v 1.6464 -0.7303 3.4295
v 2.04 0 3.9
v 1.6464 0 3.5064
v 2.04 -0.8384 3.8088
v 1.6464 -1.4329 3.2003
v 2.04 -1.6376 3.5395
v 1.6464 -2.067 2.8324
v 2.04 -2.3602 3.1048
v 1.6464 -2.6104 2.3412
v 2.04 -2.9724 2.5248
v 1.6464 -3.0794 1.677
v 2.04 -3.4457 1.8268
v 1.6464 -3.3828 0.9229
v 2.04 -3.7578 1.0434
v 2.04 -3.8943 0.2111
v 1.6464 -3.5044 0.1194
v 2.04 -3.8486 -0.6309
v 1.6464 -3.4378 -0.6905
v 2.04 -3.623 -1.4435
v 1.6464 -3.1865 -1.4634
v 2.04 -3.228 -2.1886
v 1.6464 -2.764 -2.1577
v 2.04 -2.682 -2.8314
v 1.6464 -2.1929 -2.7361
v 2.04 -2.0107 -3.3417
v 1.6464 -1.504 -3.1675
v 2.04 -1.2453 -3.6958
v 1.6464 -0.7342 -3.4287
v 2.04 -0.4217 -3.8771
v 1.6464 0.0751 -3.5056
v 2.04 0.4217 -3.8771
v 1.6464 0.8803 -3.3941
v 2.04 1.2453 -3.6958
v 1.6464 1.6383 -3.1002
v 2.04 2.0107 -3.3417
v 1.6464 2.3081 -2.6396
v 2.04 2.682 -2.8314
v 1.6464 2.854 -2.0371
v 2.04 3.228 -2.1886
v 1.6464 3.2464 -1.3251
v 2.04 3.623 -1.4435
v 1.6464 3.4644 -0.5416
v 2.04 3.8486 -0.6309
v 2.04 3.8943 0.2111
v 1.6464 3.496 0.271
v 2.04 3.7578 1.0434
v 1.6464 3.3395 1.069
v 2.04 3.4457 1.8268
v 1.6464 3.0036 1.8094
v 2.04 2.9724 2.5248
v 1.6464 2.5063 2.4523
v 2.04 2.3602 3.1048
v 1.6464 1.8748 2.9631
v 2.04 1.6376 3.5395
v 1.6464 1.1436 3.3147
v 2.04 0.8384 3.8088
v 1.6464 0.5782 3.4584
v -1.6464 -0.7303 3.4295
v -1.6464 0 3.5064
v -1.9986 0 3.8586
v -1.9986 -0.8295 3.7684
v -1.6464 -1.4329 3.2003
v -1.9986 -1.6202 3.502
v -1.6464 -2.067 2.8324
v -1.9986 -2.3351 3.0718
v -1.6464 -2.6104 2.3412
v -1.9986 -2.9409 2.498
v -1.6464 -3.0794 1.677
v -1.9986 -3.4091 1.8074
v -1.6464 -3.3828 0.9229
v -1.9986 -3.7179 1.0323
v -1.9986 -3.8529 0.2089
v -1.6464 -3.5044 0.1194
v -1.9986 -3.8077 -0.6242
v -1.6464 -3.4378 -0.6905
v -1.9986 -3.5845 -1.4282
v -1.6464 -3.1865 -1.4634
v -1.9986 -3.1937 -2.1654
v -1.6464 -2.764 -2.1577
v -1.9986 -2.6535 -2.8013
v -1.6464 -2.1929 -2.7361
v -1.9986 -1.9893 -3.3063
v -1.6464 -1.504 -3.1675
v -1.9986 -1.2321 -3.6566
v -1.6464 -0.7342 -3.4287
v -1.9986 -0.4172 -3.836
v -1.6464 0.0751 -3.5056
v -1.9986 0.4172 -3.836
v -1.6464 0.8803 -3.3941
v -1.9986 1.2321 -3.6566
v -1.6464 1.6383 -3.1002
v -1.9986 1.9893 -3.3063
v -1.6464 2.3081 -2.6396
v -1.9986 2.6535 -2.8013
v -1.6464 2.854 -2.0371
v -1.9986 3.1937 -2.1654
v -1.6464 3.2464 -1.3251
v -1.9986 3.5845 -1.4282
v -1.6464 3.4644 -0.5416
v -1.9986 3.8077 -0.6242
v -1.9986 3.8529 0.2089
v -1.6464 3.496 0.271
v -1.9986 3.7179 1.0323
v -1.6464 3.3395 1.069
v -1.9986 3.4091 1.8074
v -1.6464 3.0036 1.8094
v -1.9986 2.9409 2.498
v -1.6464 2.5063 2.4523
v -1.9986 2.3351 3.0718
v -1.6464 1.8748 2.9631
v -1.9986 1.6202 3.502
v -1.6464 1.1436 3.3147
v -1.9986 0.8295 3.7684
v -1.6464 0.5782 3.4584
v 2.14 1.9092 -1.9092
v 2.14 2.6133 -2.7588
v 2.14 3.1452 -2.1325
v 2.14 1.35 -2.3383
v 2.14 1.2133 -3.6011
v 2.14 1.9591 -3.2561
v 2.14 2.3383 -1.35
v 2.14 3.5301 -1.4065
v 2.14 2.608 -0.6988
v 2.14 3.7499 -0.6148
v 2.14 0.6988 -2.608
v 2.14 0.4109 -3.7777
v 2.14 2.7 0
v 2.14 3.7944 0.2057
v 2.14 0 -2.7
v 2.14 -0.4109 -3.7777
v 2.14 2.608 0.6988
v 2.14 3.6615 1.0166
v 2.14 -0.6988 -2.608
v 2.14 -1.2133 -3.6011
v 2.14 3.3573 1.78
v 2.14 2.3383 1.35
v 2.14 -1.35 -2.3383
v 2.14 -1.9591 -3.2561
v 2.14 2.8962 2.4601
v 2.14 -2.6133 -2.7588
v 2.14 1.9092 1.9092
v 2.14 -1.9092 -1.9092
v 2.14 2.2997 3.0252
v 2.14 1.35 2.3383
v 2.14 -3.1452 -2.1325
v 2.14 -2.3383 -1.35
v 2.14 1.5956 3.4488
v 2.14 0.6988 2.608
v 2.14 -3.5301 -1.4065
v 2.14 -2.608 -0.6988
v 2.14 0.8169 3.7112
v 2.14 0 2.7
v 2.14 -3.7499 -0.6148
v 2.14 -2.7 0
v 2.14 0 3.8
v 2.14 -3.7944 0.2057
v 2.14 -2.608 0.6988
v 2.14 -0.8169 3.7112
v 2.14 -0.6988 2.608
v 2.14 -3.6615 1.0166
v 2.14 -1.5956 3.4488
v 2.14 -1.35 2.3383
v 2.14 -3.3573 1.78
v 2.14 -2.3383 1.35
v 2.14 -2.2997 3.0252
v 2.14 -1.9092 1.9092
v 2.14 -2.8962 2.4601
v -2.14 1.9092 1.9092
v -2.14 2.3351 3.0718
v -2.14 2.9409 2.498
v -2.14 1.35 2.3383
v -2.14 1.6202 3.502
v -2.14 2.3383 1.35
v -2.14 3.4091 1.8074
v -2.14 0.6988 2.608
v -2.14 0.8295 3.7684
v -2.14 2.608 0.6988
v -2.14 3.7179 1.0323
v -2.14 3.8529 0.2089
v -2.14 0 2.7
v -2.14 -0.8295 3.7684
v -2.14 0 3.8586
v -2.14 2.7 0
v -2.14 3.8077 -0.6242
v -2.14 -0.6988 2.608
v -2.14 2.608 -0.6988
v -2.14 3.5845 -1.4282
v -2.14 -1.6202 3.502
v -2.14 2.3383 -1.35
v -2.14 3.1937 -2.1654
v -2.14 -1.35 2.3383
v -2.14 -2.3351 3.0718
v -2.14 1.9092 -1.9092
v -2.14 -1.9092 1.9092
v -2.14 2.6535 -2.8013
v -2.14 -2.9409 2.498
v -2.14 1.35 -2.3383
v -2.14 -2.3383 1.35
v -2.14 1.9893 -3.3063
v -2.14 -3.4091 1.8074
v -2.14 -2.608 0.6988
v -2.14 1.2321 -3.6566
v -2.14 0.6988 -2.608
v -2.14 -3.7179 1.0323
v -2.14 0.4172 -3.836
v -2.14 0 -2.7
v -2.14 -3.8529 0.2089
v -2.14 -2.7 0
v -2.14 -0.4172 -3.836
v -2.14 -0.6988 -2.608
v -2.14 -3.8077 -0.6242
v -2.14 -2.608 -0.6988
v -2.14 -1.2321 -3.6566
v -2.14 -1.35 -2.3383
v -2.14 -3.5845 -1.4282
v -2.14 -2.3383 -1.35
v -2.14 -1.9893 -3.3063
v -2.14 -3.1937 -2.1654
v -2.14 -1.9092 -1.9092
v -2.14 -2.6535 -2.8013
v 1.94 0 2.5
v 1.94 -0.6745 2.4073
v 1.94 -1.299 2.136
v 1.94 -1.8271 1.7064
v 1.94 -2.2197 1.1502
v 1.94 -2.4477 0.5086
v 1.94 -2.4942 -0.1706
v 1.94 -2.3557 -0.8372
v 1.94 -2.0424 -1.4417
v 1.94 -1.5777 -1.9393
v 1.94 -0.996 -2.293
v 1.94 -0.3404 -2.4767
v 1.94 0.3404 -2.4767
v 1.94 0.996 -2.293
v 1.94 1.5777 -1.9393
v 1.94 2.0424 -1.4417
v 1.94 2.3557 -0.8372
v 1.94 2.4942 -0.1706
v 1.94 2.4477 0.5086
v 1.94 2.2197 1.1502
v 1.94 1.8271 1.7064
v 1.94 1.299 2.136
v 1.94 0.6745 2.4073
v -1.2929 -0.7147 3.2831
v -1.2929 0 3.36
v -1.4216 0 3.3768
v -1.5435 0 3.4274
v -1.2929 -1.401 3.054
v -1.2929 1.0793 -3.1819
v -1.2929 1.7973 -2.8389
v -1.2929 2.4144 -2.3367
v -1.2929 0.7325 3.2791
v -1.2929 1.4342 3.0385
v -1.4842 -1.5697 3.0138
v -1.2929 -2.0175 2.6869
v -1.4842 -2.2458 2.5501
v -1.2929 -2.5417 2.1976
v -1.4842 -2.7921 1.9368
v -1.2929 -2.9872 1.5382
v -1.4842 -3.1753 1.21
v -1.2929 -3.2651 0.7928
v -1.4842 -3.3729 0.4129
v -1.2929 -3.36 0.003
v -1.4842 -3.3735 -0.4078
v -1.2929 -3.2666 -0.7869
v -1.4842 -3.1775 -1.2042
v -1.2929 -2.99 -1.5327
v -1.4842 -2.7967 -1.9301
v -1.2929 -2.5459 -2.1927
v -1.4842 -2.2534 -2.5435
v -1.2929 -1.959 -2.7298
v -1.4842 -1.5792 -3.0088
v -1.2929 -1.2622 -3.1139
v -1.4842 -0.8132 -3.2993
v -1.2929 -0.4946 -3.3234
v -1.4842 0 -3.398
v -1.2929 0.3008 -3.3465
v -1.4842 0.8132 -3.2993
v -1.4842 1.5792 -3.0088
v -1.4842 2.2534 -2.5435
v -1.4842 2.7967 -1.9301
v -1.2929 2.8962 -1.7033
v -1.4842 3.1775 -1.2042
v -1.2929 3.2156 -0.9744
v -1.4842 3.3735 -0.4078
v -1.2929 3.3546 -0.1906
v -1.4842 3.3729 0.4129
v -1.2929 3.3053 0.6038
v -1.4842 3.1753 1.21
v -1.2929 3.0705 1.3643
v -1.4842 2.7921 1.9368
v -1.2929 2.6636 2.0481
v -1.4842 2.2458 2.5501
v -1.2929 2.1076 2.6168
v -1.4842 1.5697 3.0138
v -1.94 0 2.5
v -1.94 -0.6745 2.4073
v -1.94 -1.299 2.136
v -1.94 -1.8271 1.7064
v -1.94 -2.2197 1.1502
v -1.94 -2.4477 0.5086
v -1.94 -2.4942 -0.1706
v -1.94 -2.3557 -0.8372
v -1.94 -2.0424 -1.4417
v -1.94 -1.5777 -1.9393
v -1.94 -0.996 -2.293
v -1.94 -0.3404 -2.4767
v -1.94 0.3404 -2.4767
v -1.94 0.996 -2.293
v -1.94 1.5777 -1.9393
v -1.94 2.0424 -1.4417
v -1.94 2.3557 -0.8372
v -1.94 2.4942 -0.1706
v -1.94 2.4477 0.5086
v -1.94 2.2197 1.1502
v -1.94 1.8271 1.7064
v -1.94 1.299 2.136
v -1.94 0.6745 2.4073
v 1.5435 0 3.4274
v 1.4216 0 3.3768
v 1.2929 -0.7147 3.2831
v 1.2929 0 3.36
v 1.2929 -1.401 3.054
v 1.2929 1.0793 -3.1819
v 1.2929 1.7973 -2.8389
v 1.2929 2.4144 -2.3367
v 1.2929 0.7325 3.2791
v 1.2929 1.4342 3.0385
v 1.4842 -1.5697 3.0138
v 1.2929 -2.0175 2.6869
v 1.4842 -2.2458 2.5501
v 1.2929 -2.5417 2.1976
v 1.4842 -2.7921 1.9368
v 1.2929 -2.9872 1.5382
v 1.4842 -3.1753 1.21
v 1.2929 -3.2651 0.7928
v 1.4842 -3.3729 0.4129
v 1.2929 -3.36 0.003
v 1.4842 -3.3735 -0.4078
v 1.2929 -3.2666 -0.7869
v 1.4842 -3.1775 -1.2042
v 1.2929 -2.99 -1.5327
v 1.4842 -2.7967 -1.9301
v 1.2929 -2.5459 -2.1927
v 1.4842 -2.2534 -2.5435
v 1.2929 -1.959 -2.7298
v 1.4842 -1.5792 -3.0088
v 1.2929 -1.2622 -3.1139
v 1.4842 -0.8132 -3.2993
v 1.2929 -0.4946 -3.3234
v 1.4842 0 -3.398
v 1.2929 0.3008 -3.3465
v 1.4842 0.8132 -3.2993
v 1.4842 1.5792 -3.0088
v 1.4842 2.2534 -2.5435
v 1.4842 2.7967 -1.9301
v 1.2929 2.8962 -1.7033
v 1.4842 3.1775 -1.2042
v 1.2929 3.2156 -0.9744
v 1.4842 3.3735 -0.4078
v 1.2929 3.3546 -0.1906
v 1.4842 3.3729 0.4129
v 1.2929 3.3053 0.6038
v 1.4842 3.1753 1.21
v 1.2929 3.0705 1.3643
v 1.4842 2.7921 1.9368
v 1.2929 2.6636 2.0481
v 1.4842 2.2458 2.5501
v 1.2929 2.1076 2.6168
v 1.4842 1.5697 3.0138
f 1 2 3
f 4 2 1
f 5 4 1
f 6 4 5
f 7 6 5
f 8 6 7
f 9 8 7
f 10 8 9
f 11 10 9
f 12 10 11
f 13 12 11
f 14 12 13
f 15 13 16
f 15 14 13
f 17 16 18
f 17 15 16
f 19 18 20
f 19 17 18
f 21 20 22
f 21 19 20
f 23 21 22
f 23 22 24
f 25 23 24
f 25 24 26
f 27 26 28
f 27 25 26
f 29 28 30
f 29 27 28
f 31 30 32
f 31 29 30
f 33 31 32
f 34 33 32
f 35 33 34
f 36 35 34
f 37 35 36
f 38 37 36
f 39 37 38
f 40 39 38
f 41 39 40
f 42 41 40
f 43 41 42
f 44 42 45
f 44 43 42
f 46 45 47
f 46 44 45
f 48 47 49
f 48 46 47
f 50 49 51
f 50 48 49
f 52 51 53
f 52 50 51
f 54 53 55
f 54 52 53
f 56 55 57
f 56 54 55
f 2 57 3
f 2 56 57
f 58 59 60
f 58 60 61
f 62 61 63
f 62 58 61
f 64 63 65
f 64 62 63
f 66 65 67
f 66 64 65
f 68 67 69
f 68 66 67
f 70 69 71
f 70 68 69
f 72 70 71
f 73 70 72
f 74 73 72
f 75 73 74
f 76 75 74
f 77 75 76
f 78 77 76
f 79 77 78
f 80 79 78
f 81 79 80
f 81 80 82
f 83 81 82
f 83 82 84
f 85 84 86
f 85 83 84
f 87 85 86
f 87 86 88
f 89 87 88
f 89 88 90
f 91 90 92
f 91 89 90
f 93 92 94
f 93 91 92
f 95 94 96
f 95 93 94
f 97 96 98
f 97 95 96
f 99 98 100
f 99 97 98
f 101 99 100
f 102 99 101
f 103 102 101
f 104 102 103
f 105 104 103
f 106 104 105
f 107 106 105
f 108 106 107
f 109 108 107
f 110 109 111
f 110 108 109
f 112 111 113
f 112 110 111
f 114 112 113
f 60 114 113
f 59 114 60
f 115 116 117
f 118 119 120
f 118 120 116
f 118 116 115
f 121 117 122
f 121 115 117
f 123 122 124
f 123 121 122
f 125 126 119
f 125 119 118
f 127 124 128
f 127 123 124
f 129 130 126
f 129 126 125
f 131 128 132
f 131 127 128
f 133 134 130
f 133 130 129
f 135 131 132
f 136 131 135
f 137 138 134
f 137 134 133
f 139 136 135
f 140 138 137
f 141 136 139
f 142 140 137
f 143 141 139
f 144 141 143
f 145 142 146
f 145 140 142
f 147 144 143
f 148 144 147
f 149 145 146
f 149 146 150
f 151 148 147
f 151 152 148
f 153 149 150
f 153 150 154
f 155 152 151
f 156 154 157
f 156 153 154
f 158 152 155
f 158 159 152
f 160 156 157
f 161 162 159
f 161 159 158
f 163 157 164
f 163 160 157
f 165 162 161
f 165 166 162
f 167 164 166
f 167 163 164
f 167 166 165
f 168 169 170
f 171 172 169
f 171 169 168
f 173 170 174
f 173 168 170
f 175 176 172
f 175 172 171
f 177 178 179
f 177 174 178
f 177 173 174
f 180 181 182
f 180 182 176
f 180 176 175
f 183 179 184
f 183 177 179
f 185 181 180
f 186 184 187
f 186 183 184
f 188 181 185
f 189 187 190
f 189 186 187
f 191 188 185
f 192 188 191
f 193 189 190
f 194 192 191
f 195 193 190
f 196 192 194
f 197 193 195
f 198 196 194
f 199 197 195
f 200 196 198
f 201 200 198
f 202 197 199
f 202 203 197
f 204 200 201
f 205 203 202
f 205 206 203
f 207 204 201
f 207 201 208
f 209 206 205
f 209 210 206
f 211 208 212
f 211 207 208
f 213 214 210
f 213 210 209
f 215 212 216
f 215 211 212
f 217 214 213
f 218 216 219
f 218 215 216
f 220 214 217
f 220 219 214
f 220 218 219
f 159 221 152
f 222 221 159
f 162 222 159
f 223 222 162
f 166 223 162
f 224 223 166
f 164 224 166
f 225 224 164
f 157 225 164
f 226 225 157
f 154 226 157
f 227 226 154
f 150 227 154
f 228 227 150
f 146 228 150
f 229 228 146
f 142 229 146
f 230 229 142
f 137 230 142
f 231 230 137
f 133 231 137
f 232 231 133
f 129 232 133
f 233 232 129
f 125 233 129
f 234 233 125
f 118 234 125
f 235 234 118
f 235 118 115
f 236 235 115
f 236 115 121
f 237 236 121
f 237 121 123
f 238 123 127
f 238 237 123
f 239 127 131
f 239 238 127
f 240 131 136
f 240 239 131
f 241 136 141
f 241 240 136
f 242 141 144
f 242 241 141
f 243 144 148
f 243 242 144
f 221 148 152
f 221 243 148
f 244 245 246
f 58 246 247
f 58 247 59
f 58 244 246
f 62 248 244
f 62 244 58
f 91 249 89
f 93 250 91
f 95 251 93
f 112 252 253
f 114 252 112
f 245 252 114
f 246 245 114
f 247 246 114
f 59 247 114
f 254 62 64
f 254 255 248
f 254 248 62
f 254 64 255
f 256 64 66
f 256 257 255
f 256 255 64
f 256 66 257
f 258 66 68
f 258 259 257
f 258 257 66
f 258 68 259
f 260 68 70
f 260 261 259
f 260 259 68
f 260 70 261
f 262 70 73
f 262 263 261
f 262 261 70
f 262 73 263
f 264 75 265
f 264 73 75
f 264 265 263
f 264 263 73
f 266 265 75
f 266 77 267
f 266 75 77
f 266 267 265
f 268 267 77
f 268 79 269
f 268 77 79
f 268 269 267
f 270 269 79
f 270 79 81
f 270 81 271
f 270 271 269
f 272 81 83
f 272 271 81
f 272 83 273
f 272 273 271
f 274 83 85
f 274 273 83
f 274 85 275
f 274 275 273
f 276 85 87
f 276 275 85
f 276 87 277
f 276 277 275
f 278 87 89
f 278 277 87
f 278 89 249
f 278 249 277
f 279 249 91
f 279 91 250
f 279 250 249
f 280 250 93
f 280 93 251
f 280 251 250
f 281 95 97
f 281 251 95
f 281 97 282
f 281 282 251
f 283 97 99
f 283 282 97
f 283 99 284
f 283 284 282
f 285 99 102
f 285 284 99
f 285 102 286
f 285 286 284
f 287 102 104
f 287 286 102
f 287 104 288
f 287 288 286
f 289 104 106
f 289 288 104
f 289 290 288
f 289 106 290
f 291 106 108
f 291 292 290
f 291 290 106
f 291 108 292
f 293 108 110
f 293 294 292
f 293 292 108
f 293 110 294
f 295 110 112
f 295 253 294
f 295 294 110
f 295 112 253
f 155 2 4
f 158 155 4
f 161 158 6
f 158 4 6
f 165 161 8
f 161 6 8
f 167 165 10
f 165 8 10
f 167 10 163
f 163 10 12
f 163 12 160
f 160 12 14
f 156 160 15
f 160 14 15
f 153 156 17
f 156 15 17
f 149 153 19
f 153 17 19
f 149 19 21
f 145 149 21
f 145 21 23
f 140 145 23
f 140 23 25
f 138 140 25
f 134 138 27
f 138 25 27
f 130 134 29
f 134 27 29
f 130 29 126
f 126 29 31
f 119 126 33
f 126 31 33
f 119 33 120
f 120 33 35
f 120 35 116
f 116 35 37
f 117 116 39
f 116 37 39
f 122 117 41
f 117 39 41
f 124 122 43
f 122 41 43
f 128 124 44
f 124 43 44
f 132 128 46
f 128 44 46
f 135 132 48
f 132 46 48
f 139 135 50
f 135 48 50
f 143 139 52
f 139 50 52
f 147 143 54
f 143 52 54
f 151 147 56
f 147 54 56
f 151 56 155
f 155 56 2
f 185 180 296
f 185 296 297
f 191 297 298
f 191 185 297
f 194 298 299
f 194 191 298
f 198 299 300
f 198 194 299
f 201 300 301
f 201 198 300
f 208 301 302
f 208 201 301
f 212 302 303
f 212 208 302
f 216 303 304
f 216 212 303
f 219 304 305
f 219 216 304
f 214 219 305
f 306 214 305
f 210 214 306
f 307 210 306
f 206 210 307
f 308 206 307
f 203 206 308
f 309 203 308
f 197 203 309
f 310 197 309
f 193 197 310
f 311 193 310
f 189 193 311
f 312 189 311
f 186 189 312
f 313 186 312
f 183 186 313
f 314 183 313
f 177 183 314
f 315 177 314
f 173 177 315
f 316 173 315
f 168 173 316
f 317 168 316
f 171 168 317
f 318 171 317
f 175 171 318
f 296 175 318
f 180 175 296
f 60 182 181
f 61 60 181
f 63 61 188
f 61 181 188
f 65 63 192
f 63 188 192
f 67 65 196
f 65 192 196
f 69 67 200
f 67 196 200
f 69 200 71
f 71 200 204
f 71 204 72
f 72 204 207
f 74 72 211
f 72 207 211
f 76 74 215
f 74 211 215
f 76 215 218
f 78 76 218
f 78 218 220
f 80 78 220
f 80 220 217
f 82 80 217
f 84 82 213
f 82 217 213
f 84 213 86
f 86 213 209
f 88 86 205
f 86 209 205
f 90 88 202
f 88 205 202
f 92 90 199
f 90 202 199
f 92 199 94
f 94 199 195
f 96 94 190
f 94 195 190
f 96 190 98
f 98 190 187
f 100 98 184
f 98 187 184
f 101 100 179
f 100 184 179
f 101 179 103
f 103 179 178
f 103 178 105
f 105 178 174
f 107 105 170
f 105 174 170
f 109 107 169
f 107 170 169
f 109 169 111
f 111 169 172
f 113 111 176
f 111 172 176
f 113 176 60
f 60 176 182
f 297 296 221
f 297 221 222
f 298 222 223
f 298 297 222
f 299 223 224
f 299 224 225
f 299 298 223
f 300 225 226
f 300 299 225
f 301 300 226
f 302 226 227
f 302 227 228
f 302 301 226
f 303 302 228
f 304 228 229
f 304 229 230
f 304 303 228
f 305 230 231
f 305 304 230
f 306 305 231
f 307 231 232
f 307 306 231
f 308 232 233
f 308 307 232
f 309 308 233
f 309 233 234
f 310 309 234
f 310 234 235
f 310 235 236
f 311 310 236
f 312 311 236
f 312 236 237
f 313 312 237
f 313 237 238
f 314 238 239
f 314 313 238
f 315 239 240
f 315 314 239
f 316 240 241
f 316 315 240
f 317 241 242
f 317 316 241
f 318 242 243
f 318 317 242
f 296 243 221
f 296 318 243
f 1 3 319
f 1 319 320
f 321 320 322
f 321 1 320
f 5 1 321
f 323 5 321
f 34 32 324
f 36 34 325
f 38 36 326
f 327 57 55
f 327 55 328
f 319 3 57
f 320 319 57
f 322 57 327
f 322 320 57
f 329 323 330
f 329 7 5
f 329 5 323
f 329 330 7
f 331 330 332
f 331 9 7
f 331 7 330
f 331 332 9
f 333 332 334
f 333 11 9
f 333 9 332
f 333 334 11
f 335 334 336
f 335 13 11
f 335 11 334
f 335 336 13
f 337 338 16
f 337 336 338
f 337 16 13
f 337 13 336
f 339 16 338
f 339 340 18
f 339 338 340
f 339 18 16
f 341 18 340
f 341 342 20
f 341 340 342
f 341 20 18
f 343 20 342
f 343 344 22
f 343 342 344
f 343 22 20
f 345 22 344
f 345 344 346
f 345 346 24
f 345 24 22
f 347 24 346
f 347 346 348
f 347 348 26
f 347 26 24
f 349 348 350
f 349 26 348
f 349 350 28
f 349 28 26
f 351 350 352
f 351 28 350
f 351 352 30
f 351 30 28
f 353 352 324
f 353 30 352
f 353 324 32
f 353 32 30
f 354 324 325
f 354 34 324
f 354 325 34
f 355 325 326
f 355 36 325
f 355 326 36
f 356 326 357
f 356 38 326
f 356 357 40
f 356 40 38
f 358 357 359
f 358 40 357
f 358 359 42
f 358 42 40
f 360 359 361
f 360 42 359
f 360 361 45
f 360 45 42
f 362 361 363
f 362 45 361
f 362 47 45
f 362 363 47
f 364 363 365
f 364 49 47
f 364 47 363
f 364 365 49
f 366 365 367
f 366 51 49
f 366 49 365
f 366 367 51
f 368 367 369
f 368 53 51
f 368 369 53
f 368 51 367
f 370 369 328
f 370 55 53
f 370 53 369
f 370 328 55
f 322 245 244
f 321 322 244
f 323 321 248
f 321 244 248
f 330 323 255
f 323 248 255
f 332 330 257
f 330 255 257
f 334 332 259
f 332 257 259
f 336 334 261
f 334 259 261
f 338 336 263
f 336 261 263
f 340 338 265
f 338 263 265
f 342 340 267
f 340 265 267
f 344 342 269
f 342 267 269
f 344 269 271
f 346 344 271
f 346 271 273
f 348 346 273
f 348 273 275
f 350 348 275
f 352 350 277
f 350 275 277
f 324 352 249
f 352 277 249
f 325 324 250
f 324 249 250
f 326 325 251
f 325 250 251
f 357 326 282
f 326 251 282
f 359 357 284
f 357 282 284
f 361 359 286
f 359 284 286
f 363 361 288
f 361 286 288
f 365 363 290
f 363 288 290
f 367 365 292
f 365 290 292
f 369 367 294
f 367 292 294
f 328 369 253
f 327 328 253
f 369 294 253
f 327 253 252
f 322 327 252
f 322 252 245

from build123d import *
from OCP.BRepFilletAPI import BRepFilletAPI_MakeChamfer

# Parameters (mm, degrees)
CHAMFER1_SIZE  = 0.2
CHAMFER1_SIZE2 = 0.141421356
FILLET1_R      = 0.5


with BuildPart() as part:
    # Sketch1 → Revolve1 (revolve)
    with BuildSketch(Plane.XY, mode=Mode.PRIVATE) as revolve1_sk:
        Polygon((0, 3.36), (1.5, 3.36), (2.14, 4), (2.14, 2.5), (-2.14, 2.5), (-2.14, 4), (-1.5, 3.36), align=None)
    revolve(revolve1_sk.sketch.rotate(Axis((0, 0, 0), (1, 0, 0)), 90), axis=Axis((0, 0, 0), (1, 0, 0)))

    # Chamfer1: one chamfer whose edges measure the first distance from different faces: ONE call of the kernel's chamfer builder (chamfer() names one face for all edges)
    chamfer1_edges_1 = [part.edges().sort_by_distance(p)[0] for p in [
        (-2.14, 0, -4),
    ]]
    chamfer1_side_1 = [part.faces().sort_by_distance(p)[0] for p in [
        (-1.82, 0, -3.68),
    ]]
    chamfer1_edges_2 = [part.edges().sort_by_distance(p)[0] for p in [
        (-2.14, 0, -2.5),
        (2.14, 0, -2.5),
    ]]
    chamfer1_edges_3 = [part.edges().sort_by_distance(p)[0] for p in [
        (2.14, 0, -4),
    ]]
    chamfer1_side_3 = [part.faces().sort_by_distance(p)[0] for p in [
        (2.14, 0, -3.886862915),
    ]]
    chamfer1 = BRepFilletAPI_MakeChamfer(part.part.solid().wrapped)
    for e in chamfer1_edges_1:
        chamfer1.Add(CHAMFER1_SIZE, CHAMFER1_SIZE2, e.wrapped, chamfer1_side_1[0].wrapped)  # the first distance lies on this face
    for e in chamfer1_edges_2:
        chamfer1.Add(CHAMFER1_SIZE, e.wrapped)
    for e in chamfer1_edges_3:
        chamfer1.Add(CHAMFER1_SIZE, CHAMFER1_SIZE2, e.wrapped, chamfer1_side_3[0].wrapped)  # the first distance lies on this face
    add(Compound.cast(chamfer1.Shape()), mode=Mode.REPLACE)

    # Fillet1
    fillet1_edges = [part.edges().sort_by_distance(p)[0] for p in [
        (-1.5, 0, -3.36),
        (1.5, 0, -3.36),
    ]]
    fillet(fillet1_edges, radius=FILLET1_R)


solid = part.part
